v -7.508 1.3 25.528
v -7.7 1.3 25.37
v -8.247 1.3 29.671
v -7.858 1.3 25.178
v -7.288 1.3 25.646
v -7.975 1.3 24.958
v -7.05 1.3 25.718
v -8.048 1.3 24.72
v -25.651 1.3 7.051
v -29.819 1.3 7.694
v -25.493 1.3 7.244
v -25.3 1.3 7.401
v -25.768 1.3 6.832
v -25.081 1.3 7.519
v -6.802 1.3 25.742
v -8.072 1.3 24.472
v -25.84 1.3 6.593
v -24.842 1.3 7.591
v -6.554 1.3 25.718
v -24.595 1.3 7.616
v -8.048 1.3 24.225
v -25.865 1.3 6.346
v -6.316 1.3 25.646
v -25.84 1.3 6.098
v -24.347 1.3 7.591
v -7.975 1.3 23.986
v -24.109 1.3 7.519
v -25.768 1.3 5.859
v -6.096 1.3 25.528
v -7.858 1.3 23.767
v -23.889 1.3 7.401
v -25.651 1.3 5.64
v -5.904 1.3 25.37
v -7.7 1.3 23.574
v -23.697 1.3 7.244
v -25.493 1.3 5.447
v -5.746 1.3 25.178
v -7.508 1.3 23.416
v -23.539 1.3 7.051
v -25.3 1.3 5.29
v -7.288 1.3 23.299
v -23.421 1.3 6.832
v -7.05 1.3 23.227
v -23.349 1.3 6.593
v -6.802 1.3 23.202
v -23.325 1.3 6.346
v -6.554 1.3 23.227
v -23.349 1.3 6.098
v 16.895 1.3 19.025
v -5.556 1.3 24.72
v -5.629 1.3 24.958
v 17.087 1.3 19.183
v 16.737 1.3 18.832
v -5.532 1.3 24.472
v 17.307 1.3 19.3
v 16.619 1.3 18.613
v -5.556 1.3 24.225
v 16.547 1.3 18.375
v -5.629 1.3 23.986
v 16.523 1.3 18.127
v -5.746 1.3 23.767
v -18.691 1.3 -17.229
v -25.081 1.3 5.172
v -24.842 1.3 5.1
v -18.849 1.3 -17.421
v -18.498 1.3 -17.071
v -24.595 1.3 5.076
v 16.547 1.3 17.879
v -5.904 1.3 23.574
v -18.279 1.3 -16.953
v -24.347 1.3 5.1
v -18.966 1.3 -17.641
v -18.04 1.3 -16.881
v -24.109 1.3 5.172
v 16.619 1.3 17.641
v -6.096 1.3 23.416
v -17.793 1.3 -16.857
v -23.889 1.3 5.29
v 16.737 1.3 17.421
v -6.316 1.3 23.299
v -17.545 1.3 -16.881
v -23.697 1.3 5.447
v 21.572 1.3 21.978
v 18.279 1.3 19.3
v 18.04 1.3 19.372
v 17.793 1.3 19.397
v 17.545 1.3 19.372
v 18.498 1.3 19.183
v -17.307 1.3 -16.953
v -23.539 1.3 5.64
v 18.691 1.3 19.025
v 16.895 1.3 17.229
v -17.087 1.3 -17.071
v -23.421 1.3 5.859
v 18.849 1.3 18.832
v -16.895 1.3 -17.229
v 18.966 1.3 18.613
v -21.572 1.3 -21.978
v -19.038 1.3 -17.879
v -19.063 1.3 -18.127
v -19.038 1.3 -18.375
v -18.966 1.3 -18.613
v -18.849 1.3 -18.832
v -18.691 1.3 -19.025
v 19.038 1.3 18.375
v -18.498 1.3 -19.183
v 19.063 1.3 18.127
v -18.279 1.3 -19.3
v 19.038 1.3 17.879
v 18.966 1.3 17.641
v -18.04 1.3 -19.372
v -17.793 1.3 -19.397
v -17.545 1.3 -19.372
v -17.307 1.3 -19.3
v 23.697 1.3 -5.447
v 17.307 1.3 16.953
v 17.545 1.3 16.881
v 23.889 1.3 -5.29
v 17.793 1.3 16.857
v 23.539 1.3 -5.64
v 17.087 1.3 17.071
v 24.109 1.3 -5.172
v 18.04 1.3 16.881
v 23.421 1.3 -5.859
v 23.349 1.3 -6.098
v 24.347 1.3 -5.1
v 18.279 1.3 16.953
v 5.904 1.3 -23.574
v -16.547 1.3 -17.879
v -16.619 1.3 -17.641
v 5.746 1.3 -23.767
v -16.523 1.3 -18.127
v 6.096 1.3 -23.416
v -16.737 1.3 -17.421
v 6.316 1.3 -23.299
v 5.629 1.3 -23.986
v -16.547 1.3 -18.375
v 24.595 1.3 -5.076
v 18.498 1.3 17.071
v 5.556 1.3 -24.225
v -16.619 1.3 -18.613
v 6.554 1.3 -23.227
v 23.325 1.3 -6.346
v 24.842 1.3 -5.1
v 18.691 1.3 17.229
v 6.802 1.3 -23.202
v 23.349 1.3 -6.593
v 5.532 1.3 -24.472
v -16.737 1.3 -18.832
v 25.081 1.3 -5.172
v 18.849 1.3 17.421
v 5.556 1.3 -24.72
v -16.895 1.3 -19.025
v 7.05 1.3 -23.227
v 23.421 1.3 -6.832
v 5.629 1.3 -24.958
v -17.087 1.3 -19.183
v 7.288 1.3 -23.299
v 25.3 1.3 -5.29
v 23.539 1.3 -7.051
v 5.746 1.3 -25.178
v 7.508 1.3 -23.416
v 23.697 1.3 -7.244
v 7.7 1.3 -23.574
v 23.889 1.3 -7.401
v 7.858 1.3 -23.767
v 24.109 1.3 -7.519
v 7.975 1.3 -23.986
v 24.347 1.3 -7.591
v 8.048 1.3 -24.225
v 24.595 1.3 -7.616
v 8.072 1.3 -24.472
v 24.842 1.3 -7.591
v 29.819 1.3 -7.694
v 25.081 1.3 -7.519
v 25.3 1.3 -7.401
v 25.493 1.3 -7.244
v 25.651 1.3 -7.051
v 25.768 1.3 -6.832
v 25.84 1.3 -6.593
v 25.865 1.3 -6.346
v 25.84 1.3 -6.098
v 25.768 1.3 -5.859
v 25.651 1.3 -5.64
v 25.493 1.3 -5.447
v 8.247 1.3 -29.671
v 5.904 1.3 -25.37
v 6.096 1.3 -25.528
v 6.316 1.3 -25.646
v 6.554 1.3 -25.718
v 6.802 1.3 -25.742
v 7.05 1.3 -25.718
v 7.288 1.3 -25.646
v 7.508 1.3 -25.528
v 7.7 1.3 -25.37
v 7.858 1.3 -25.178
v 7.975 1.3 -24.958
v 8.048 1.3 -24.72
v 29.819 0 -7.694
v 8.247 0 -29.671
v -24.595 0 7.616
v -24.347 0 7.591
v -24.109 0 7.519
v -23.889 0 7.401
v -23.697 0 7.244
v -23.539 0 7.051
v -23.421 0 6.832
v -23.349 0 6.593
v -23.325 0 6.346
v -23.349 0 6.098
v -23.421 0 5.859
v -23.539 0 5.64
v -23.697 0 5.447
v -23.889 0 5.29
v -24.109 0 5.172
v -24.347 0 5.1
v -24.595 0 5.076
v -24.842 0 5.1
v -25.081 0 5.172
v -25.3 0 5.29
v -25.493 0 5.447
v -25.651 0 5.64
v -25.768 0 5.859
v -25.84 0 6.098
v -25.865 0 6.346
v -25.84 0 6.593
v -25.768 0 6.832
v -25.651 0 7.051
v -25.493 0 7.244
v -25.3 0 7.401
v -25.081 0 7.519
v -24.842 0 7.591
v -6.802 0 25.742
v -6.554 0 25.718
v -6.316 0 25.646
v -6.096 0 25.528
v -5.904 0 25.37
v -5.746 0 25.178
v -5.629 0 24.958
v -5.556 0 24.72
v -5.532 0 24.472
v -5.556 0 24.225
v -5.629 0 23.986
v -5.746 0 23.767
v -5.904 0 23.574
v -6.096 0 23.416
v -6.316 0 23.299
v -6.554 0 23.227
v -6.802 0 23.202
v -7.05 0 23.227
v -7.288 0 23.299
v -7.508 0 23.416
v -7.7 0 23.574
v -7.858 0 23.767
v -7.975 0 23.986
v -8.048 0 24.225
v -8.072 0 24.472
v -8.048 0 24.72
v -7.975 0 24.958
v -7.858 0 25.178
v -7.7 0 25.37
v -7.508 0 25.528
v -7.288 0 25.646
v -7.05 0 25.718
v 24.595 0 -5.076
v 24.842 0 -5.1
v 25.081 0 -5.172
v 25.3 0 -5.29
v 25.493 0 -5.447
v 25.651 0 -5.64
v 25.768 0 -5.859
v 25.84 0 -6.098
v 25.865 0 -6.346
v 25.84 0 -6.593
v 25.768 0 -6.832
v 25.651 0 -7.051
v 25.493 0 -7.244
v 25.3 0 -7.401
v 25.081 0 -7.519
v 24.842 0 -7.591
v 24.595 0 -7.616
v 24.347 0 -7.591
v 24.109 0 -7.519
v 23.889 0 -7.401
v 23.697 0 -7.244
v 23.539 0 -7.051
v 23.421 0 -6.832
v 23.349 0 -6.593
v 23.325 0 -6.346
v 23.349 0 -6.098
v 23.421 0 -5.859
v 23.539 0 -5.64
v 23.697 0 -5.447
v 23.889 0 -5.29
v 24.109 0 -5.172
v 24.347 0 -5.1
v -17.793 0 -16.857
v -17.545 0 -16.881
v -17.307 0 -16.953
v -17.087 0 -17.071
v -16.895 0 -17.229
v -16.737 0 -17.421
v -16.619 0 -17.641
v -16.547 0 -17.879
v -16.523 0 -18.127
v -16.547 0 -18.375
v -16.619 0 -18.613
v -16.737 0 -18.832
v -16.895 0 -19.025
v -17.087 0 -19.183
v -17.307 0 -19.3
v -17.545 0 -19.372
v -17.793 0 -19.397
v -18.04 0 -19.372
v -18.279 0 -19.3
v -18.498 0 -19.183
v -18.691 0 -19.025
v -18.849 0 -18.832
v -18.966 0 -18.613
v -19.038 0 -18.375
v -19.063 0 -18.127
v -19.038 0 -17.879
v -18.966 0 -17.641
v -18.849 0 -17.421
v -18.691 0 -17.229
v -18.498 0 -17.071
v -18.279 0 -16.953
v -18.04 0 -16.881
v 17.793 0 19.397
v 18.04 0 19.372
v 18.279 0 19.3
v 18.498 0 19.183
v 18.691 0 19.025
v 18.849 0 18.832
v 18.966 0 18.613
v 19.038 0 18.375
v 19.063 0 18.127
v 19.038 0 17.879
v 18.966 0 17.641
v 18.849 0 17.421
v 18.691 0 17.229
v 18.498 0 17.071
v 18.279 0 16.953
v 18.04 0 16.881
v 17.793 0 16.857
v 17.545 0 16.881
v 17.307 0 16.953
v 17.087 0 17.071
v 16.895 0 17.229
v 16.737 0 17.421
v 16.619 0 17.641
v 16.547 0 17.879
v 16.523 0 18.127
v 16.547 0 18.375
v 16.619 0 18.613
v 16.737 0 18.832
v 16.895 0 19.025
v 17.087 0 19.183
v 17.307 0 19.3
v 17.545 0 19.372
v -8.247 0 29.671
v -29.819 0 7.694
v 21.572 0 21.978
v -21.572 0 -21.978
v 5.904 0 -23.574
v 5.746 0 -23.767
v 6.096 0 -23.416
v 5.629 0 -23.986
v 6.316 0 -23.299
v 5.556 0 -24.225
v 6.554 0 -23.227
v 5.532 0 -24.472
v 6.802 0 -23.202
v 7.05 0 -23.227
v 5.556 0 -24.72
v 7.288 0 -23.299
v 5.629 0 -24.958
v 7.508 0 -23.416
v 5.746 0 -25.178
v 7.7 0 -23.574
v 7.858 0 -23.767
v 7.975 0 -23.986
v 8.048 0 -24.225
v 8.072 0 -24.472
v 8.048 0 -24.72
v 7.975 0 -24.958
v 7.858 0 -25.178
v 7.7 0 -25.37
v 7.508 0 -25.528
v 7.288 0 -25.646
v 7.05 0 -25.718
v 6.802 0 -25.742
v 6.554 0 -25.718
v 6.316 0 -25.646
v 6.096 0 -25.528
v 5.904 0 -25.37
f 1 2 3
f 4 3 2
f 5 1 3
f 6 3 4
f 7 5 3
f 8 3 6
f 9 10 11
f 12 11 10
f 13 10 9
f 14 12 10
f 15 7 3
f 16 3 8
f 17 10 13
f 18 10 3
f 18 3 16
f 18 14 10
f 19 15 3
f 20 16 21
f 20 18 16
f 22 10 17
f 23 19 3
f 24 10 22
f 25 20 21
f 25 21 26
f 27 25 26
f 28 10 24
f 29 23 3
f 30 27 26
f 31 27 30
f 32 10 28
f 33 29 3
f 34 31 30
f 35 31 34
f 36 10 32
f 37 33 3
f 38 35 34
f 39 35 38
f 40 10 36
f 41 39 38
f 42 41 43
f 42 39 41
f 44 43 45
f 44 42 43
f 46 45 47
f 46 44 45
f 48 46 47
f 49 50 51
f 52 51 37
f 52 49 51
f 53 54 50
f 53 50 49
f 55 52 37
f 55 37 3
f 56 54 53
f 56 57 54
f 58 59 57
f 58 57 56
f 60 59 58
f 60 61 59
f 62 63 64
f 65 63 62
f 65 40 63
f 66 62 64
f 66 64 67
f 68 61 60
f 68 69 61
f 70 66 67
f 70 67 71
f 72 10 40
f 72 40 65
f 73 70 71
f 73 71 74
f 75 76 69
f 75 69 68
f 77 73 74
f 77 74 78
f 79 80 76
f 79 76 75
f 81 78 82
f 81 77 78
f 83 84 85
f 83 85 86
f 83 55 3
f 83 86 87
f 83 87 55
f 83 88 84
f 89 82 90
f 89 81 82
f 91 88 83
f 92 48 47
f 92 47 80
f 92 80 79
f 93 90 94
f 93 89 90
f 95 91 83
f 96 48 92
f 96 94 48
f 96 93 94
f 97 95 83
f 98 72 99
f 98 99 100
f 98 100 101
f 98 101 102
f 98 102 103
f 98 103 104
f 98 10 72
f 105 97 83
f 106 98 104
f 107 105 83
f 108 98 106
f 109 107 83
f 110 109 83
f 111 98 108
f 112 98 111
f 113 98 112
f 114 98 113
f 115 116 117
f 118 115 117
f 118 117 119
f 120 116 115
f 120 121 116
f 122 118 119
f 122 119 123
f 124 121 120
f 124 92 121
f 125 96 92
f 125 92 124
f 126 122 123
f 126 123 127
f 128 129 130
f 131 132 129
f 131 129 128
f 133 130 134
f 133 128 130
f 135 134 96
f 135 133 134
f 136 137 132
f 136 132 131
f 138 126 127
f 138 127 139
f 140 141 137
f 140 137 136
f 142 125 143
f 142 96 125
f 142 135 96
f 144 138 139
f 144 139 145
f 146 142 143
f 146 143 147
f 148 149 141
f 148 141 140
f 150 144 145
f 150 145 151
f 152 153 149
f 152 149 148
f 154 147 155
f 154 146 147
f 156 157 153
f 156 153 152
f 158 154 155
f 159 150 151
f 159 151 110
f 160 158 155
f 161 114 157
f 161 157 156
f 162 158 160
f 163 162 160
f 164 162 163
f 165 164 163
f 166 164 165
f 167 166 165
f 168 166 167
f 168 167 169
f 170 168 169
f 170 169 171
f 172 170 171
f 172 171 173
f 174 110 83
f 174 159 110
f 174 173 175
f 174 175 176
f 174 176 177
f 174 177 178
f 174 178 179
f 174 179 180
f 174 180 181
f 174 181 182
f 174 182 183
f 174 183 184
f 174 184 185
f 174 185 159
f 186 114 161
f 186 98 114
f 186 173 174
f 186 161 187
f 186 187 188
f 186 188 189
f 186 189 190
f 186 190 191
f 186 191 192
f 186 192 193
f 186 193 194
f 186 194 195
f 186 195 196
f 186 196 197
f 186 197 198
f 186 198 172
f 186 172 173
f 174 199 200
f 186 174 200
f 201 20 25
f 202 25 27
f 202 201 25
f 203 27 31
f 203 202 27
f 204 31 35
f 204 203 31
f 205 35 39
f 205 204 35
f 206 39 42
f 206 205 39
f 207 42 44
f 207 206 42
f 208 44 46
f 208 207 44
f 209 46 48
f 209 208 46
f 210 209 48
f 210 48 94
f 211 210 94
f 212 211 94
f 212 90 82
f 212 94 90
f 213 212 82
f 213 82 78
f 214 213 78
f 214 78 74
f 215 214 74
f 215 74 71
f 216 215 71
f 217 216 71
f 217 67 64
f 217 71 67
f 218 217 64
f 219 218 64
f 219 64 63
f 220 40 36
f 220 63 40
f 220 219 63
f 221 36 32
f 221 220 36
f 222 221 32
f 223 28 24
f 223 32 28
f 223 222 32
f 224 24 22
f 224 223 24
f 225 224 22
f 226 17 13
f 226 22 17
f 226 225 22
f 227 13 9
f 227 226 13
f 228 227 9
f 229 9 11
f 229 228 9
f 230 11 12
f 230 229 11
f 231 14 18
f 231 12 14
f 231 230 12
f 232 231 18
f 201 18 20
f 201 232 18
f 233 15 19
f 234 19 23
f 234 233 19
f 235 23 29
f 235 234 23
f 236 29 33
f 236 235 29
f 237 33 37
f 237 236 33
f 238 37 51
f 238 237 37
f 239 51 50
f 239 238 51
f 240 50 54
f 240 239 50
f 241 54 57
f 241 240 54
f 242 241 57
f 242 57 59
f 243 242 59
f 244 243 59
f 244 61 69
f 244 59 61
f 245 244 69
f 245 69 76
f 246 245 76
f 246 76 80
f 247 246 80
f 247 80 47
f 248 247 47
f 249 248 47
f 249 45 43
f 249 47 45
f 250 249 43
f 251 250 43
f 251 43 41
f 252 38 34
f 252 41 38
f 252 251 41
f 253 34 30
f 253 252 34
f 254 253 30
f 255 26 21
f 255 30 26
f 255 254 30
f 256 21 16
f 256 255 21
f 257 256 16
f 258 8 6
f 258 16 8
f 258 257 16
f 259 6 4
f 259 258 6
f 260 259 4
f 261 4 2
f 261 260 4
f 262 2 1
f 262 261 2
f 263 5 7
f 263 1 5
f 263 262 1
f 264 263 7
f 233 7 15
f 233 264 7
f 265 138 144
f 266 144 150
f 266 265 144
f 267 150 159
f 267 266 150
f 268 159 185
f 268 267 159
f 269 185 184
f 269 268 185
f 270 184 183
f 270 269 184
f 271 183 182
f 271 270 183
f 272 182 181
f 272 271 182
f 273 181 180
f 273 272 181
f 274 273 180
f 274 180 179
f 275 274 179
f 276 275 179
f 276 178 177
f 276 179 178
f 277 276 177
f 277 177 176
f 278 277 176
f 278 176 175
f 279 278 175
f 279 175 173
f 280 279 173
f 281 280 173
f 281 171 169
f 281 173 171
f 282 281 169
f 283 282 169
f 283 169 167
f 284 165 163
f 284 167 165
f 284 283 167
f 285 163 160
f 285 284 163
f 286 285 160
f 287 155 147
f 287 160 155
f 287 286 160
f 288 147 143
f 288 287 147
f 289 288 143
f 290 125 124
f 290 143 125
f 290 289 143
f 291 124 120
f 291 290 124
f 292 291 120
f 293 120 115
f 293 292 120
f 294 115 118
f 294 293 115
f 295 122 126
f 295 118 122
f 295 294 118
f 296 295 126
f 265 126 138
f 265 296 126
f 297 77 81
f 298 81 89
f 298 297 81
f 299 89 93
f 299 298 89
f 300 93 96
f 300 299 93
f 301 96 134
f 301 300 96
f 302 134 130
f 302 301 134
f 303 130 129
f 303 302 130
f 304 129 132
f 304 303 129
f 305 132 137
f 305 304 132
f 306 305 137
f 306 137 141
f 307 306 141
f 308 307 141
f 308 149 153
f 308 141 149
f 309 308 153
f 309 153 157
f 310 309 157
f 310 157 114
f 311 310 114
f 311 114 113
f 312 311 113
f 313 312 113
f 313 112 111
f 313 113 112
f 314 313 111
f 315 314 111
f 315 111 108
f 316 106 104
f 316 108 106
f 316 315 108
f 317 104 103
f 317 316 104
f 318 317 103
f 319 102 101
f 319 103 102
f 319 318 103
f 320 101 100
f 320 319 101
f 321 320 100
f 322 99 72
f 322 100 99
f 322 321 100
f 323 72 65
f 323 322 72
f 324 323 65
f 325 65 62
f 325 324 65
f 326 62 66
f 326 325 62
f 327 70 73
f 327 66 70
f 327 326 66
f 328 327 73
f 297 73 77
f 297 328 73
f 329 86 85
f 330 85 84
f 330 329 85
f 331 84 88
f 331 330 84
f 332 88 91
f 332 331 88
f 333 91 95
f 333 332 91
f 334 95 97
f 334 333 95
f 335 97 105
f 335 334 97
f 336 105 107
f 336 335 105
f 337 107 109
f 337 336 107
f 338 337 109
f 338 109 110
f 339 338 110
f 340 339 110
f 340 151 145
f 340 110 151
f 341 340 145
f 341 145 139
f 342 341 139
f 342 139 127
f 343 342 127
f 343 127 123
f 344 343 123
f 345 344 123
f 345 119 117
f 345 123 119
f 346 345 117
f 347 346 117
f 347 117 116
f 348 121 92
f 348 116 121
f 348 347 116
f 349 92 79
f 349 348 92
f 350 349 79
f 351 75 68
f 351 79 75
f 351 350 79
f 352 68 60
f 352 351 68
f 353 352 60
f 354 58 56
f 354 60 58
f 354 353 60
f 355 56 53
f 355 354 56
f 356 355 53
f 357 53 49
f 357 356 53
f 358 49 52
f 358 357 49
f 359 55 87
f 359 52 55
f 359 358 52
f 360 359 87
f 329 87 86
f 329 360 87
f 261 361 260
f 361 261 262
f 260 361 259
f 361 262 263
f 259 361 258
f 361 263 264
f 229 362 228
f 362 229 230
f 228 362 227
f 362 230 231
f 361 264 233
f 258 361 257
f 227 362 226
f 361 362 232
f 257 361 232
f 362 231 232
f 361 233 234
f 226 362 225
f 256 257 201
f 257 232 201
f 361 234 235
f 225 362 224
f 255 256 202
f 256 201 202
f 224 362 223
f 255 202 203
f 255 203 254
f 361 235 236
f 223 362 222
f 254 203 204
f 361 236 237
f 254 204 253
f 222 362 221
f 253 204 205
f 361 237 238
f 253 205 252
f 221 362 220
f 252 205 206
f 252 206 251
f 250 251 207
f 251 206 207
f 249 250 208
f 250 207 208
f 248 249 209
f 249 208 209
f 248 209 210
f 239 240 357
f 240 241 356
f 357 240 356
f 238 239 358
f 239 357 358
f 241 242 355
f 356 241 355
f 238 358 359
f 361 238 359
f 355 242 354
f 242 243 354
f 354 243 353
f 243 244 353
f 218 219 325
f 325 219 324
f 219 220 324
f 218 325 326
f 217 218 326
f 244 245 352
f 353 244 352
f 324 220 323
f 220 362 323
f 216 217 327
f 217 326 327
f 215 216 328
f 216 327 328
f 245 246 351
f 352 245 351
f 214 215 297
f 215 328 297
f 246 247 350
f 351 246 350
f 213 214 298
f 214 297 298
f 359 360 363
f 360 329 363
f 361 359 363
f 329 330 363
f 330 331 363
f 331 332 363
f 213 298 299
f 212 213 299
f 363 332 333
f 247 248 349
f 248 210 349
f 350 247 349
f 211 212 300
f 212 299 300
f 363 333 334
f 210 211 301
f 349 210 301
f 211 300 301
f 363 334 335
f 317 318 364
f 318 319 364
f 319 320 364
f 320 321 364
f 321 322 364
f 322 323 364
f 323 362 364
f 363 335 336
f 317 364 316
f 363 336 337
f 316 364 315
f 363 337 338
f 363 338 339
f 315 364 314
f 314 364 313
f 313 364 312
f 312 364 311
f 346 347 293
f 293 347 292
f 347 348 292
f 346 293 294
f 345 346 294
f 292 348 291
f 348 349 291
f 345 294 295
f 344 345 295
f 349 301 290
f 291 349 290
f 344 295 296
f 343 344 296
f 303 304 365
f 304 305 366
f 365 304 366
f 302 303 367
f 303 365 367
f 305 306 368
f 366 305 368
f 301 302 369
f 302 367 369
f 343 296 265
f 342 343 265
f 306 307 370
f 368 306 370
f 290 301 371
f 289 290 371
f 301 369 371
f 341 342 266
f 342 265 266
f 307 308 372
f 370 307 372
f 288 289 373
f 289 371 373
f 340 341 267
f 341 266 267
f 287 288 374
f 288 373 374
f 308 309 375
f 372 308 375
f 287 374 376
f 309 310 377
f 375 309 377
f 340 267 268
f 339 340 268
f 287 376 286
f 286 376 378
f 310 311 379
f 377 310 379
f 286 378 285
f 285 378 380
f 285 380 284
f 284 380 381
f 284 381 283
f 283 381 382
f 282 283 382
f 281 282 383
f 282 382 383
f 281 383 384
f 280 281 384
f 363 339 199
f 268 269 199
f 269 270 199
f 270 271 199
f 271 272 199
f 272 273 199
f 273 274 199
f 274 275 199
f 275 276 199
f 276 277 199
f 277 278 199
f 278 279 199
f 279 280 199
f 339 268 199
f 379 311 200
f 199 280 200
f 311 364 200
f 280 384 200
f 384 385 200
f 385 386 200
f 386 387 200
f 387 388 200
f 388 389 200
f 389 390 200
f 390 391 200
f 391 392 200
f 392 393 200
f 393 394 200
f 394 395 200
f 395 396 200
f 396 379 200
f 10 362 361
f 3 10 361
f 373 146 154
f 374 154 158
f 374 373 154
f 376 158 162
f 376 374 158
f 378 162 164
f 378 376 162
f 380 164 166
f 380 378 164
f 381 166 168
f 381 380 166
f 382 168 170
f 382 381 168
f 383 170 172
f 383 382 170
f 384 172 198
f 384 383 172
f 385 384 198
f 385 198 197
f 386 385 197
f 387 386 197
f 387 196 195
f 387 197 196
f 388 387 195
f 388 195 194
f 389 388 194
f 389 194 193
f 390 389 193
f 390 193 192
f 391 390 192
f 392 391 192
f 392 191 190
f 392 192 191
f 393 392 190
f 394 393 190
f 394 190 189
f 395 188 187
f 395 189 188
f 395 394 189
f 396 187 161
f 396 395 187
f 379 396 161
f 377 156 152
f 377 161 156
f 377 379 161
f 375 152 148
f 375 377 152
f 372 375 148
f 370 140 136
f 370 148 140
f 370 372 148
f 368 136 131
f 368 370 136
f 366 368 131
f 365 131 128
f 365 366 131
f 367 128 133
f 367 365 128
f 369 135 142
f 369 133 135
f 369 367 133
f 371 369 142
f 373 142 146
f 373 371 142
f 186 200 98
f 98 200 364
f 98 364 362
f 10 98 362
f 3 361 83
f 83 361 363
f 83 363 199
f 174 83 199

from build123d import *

# Parameters (mm, degrees)
BOSS_EXTRUDE1_DEPTH = 1.3
SKETCH2_R           = 1.27
CUT_EXTRUDE2_DEPTH  = 43.086324906


with BuildPart() as part:
    # Sketch1 → Boss-Extrude1 (new body)
    with BuildSketch(Plane(origin=(0, 0, 0), x_dir=(1, 0, 0), z_dir=(0, 1, 0))):
        Polygon((21.57246336, -21.977580043), (29.819374311, 7.693511271), (8.246910951, 29.671091314), (-21.57246336, 21.977580043), (-29.819374311, -7.693511271), (-8.246910951, -29.671091314), align=None)
    extrude(amount=BOSS_EXTRUDE1_DEPTH)

    # Sketch2 → Cut-Extrude2 (cut, through all)
    with BuildSketch(Plane(origin=(0, 0, 0), x_dir=(1, 0, 0), z_dir=(0, 1, 0))):
        with Locations(Location((6.801937511, 24.472303653, 0), (0, 0, 270))):
            Circle(SKETCH2_R)
        with Locations(Location((24.594605408, 6.345501147, 0), (0, 0, 270))):
            Circle(SKETCH2_R)
        with Locations(Location((17.792667898, -18.126802506, 0), (0, 0, 270))):
            Circle(SKETCH2_R)
        with Locations(Location((-6.801937511, -24.472303653, 0), (0, 0, 270))):
            Circle(SKETCH2_R)
        with Locations(Location((-24.594605408, -6.345501147, 0), (0, 0, 270))):
            Circle(SKETCH2_R)
        with Locations(Location((-17.792667898, 18.126802506, 0), (0, 0, 270))):
            Circle(SKETCH2_R)
    extrude(amount=CUT_EXTRUDE2_DEPTH, mode=Mode.SUBTRACT)


solid = part.part
